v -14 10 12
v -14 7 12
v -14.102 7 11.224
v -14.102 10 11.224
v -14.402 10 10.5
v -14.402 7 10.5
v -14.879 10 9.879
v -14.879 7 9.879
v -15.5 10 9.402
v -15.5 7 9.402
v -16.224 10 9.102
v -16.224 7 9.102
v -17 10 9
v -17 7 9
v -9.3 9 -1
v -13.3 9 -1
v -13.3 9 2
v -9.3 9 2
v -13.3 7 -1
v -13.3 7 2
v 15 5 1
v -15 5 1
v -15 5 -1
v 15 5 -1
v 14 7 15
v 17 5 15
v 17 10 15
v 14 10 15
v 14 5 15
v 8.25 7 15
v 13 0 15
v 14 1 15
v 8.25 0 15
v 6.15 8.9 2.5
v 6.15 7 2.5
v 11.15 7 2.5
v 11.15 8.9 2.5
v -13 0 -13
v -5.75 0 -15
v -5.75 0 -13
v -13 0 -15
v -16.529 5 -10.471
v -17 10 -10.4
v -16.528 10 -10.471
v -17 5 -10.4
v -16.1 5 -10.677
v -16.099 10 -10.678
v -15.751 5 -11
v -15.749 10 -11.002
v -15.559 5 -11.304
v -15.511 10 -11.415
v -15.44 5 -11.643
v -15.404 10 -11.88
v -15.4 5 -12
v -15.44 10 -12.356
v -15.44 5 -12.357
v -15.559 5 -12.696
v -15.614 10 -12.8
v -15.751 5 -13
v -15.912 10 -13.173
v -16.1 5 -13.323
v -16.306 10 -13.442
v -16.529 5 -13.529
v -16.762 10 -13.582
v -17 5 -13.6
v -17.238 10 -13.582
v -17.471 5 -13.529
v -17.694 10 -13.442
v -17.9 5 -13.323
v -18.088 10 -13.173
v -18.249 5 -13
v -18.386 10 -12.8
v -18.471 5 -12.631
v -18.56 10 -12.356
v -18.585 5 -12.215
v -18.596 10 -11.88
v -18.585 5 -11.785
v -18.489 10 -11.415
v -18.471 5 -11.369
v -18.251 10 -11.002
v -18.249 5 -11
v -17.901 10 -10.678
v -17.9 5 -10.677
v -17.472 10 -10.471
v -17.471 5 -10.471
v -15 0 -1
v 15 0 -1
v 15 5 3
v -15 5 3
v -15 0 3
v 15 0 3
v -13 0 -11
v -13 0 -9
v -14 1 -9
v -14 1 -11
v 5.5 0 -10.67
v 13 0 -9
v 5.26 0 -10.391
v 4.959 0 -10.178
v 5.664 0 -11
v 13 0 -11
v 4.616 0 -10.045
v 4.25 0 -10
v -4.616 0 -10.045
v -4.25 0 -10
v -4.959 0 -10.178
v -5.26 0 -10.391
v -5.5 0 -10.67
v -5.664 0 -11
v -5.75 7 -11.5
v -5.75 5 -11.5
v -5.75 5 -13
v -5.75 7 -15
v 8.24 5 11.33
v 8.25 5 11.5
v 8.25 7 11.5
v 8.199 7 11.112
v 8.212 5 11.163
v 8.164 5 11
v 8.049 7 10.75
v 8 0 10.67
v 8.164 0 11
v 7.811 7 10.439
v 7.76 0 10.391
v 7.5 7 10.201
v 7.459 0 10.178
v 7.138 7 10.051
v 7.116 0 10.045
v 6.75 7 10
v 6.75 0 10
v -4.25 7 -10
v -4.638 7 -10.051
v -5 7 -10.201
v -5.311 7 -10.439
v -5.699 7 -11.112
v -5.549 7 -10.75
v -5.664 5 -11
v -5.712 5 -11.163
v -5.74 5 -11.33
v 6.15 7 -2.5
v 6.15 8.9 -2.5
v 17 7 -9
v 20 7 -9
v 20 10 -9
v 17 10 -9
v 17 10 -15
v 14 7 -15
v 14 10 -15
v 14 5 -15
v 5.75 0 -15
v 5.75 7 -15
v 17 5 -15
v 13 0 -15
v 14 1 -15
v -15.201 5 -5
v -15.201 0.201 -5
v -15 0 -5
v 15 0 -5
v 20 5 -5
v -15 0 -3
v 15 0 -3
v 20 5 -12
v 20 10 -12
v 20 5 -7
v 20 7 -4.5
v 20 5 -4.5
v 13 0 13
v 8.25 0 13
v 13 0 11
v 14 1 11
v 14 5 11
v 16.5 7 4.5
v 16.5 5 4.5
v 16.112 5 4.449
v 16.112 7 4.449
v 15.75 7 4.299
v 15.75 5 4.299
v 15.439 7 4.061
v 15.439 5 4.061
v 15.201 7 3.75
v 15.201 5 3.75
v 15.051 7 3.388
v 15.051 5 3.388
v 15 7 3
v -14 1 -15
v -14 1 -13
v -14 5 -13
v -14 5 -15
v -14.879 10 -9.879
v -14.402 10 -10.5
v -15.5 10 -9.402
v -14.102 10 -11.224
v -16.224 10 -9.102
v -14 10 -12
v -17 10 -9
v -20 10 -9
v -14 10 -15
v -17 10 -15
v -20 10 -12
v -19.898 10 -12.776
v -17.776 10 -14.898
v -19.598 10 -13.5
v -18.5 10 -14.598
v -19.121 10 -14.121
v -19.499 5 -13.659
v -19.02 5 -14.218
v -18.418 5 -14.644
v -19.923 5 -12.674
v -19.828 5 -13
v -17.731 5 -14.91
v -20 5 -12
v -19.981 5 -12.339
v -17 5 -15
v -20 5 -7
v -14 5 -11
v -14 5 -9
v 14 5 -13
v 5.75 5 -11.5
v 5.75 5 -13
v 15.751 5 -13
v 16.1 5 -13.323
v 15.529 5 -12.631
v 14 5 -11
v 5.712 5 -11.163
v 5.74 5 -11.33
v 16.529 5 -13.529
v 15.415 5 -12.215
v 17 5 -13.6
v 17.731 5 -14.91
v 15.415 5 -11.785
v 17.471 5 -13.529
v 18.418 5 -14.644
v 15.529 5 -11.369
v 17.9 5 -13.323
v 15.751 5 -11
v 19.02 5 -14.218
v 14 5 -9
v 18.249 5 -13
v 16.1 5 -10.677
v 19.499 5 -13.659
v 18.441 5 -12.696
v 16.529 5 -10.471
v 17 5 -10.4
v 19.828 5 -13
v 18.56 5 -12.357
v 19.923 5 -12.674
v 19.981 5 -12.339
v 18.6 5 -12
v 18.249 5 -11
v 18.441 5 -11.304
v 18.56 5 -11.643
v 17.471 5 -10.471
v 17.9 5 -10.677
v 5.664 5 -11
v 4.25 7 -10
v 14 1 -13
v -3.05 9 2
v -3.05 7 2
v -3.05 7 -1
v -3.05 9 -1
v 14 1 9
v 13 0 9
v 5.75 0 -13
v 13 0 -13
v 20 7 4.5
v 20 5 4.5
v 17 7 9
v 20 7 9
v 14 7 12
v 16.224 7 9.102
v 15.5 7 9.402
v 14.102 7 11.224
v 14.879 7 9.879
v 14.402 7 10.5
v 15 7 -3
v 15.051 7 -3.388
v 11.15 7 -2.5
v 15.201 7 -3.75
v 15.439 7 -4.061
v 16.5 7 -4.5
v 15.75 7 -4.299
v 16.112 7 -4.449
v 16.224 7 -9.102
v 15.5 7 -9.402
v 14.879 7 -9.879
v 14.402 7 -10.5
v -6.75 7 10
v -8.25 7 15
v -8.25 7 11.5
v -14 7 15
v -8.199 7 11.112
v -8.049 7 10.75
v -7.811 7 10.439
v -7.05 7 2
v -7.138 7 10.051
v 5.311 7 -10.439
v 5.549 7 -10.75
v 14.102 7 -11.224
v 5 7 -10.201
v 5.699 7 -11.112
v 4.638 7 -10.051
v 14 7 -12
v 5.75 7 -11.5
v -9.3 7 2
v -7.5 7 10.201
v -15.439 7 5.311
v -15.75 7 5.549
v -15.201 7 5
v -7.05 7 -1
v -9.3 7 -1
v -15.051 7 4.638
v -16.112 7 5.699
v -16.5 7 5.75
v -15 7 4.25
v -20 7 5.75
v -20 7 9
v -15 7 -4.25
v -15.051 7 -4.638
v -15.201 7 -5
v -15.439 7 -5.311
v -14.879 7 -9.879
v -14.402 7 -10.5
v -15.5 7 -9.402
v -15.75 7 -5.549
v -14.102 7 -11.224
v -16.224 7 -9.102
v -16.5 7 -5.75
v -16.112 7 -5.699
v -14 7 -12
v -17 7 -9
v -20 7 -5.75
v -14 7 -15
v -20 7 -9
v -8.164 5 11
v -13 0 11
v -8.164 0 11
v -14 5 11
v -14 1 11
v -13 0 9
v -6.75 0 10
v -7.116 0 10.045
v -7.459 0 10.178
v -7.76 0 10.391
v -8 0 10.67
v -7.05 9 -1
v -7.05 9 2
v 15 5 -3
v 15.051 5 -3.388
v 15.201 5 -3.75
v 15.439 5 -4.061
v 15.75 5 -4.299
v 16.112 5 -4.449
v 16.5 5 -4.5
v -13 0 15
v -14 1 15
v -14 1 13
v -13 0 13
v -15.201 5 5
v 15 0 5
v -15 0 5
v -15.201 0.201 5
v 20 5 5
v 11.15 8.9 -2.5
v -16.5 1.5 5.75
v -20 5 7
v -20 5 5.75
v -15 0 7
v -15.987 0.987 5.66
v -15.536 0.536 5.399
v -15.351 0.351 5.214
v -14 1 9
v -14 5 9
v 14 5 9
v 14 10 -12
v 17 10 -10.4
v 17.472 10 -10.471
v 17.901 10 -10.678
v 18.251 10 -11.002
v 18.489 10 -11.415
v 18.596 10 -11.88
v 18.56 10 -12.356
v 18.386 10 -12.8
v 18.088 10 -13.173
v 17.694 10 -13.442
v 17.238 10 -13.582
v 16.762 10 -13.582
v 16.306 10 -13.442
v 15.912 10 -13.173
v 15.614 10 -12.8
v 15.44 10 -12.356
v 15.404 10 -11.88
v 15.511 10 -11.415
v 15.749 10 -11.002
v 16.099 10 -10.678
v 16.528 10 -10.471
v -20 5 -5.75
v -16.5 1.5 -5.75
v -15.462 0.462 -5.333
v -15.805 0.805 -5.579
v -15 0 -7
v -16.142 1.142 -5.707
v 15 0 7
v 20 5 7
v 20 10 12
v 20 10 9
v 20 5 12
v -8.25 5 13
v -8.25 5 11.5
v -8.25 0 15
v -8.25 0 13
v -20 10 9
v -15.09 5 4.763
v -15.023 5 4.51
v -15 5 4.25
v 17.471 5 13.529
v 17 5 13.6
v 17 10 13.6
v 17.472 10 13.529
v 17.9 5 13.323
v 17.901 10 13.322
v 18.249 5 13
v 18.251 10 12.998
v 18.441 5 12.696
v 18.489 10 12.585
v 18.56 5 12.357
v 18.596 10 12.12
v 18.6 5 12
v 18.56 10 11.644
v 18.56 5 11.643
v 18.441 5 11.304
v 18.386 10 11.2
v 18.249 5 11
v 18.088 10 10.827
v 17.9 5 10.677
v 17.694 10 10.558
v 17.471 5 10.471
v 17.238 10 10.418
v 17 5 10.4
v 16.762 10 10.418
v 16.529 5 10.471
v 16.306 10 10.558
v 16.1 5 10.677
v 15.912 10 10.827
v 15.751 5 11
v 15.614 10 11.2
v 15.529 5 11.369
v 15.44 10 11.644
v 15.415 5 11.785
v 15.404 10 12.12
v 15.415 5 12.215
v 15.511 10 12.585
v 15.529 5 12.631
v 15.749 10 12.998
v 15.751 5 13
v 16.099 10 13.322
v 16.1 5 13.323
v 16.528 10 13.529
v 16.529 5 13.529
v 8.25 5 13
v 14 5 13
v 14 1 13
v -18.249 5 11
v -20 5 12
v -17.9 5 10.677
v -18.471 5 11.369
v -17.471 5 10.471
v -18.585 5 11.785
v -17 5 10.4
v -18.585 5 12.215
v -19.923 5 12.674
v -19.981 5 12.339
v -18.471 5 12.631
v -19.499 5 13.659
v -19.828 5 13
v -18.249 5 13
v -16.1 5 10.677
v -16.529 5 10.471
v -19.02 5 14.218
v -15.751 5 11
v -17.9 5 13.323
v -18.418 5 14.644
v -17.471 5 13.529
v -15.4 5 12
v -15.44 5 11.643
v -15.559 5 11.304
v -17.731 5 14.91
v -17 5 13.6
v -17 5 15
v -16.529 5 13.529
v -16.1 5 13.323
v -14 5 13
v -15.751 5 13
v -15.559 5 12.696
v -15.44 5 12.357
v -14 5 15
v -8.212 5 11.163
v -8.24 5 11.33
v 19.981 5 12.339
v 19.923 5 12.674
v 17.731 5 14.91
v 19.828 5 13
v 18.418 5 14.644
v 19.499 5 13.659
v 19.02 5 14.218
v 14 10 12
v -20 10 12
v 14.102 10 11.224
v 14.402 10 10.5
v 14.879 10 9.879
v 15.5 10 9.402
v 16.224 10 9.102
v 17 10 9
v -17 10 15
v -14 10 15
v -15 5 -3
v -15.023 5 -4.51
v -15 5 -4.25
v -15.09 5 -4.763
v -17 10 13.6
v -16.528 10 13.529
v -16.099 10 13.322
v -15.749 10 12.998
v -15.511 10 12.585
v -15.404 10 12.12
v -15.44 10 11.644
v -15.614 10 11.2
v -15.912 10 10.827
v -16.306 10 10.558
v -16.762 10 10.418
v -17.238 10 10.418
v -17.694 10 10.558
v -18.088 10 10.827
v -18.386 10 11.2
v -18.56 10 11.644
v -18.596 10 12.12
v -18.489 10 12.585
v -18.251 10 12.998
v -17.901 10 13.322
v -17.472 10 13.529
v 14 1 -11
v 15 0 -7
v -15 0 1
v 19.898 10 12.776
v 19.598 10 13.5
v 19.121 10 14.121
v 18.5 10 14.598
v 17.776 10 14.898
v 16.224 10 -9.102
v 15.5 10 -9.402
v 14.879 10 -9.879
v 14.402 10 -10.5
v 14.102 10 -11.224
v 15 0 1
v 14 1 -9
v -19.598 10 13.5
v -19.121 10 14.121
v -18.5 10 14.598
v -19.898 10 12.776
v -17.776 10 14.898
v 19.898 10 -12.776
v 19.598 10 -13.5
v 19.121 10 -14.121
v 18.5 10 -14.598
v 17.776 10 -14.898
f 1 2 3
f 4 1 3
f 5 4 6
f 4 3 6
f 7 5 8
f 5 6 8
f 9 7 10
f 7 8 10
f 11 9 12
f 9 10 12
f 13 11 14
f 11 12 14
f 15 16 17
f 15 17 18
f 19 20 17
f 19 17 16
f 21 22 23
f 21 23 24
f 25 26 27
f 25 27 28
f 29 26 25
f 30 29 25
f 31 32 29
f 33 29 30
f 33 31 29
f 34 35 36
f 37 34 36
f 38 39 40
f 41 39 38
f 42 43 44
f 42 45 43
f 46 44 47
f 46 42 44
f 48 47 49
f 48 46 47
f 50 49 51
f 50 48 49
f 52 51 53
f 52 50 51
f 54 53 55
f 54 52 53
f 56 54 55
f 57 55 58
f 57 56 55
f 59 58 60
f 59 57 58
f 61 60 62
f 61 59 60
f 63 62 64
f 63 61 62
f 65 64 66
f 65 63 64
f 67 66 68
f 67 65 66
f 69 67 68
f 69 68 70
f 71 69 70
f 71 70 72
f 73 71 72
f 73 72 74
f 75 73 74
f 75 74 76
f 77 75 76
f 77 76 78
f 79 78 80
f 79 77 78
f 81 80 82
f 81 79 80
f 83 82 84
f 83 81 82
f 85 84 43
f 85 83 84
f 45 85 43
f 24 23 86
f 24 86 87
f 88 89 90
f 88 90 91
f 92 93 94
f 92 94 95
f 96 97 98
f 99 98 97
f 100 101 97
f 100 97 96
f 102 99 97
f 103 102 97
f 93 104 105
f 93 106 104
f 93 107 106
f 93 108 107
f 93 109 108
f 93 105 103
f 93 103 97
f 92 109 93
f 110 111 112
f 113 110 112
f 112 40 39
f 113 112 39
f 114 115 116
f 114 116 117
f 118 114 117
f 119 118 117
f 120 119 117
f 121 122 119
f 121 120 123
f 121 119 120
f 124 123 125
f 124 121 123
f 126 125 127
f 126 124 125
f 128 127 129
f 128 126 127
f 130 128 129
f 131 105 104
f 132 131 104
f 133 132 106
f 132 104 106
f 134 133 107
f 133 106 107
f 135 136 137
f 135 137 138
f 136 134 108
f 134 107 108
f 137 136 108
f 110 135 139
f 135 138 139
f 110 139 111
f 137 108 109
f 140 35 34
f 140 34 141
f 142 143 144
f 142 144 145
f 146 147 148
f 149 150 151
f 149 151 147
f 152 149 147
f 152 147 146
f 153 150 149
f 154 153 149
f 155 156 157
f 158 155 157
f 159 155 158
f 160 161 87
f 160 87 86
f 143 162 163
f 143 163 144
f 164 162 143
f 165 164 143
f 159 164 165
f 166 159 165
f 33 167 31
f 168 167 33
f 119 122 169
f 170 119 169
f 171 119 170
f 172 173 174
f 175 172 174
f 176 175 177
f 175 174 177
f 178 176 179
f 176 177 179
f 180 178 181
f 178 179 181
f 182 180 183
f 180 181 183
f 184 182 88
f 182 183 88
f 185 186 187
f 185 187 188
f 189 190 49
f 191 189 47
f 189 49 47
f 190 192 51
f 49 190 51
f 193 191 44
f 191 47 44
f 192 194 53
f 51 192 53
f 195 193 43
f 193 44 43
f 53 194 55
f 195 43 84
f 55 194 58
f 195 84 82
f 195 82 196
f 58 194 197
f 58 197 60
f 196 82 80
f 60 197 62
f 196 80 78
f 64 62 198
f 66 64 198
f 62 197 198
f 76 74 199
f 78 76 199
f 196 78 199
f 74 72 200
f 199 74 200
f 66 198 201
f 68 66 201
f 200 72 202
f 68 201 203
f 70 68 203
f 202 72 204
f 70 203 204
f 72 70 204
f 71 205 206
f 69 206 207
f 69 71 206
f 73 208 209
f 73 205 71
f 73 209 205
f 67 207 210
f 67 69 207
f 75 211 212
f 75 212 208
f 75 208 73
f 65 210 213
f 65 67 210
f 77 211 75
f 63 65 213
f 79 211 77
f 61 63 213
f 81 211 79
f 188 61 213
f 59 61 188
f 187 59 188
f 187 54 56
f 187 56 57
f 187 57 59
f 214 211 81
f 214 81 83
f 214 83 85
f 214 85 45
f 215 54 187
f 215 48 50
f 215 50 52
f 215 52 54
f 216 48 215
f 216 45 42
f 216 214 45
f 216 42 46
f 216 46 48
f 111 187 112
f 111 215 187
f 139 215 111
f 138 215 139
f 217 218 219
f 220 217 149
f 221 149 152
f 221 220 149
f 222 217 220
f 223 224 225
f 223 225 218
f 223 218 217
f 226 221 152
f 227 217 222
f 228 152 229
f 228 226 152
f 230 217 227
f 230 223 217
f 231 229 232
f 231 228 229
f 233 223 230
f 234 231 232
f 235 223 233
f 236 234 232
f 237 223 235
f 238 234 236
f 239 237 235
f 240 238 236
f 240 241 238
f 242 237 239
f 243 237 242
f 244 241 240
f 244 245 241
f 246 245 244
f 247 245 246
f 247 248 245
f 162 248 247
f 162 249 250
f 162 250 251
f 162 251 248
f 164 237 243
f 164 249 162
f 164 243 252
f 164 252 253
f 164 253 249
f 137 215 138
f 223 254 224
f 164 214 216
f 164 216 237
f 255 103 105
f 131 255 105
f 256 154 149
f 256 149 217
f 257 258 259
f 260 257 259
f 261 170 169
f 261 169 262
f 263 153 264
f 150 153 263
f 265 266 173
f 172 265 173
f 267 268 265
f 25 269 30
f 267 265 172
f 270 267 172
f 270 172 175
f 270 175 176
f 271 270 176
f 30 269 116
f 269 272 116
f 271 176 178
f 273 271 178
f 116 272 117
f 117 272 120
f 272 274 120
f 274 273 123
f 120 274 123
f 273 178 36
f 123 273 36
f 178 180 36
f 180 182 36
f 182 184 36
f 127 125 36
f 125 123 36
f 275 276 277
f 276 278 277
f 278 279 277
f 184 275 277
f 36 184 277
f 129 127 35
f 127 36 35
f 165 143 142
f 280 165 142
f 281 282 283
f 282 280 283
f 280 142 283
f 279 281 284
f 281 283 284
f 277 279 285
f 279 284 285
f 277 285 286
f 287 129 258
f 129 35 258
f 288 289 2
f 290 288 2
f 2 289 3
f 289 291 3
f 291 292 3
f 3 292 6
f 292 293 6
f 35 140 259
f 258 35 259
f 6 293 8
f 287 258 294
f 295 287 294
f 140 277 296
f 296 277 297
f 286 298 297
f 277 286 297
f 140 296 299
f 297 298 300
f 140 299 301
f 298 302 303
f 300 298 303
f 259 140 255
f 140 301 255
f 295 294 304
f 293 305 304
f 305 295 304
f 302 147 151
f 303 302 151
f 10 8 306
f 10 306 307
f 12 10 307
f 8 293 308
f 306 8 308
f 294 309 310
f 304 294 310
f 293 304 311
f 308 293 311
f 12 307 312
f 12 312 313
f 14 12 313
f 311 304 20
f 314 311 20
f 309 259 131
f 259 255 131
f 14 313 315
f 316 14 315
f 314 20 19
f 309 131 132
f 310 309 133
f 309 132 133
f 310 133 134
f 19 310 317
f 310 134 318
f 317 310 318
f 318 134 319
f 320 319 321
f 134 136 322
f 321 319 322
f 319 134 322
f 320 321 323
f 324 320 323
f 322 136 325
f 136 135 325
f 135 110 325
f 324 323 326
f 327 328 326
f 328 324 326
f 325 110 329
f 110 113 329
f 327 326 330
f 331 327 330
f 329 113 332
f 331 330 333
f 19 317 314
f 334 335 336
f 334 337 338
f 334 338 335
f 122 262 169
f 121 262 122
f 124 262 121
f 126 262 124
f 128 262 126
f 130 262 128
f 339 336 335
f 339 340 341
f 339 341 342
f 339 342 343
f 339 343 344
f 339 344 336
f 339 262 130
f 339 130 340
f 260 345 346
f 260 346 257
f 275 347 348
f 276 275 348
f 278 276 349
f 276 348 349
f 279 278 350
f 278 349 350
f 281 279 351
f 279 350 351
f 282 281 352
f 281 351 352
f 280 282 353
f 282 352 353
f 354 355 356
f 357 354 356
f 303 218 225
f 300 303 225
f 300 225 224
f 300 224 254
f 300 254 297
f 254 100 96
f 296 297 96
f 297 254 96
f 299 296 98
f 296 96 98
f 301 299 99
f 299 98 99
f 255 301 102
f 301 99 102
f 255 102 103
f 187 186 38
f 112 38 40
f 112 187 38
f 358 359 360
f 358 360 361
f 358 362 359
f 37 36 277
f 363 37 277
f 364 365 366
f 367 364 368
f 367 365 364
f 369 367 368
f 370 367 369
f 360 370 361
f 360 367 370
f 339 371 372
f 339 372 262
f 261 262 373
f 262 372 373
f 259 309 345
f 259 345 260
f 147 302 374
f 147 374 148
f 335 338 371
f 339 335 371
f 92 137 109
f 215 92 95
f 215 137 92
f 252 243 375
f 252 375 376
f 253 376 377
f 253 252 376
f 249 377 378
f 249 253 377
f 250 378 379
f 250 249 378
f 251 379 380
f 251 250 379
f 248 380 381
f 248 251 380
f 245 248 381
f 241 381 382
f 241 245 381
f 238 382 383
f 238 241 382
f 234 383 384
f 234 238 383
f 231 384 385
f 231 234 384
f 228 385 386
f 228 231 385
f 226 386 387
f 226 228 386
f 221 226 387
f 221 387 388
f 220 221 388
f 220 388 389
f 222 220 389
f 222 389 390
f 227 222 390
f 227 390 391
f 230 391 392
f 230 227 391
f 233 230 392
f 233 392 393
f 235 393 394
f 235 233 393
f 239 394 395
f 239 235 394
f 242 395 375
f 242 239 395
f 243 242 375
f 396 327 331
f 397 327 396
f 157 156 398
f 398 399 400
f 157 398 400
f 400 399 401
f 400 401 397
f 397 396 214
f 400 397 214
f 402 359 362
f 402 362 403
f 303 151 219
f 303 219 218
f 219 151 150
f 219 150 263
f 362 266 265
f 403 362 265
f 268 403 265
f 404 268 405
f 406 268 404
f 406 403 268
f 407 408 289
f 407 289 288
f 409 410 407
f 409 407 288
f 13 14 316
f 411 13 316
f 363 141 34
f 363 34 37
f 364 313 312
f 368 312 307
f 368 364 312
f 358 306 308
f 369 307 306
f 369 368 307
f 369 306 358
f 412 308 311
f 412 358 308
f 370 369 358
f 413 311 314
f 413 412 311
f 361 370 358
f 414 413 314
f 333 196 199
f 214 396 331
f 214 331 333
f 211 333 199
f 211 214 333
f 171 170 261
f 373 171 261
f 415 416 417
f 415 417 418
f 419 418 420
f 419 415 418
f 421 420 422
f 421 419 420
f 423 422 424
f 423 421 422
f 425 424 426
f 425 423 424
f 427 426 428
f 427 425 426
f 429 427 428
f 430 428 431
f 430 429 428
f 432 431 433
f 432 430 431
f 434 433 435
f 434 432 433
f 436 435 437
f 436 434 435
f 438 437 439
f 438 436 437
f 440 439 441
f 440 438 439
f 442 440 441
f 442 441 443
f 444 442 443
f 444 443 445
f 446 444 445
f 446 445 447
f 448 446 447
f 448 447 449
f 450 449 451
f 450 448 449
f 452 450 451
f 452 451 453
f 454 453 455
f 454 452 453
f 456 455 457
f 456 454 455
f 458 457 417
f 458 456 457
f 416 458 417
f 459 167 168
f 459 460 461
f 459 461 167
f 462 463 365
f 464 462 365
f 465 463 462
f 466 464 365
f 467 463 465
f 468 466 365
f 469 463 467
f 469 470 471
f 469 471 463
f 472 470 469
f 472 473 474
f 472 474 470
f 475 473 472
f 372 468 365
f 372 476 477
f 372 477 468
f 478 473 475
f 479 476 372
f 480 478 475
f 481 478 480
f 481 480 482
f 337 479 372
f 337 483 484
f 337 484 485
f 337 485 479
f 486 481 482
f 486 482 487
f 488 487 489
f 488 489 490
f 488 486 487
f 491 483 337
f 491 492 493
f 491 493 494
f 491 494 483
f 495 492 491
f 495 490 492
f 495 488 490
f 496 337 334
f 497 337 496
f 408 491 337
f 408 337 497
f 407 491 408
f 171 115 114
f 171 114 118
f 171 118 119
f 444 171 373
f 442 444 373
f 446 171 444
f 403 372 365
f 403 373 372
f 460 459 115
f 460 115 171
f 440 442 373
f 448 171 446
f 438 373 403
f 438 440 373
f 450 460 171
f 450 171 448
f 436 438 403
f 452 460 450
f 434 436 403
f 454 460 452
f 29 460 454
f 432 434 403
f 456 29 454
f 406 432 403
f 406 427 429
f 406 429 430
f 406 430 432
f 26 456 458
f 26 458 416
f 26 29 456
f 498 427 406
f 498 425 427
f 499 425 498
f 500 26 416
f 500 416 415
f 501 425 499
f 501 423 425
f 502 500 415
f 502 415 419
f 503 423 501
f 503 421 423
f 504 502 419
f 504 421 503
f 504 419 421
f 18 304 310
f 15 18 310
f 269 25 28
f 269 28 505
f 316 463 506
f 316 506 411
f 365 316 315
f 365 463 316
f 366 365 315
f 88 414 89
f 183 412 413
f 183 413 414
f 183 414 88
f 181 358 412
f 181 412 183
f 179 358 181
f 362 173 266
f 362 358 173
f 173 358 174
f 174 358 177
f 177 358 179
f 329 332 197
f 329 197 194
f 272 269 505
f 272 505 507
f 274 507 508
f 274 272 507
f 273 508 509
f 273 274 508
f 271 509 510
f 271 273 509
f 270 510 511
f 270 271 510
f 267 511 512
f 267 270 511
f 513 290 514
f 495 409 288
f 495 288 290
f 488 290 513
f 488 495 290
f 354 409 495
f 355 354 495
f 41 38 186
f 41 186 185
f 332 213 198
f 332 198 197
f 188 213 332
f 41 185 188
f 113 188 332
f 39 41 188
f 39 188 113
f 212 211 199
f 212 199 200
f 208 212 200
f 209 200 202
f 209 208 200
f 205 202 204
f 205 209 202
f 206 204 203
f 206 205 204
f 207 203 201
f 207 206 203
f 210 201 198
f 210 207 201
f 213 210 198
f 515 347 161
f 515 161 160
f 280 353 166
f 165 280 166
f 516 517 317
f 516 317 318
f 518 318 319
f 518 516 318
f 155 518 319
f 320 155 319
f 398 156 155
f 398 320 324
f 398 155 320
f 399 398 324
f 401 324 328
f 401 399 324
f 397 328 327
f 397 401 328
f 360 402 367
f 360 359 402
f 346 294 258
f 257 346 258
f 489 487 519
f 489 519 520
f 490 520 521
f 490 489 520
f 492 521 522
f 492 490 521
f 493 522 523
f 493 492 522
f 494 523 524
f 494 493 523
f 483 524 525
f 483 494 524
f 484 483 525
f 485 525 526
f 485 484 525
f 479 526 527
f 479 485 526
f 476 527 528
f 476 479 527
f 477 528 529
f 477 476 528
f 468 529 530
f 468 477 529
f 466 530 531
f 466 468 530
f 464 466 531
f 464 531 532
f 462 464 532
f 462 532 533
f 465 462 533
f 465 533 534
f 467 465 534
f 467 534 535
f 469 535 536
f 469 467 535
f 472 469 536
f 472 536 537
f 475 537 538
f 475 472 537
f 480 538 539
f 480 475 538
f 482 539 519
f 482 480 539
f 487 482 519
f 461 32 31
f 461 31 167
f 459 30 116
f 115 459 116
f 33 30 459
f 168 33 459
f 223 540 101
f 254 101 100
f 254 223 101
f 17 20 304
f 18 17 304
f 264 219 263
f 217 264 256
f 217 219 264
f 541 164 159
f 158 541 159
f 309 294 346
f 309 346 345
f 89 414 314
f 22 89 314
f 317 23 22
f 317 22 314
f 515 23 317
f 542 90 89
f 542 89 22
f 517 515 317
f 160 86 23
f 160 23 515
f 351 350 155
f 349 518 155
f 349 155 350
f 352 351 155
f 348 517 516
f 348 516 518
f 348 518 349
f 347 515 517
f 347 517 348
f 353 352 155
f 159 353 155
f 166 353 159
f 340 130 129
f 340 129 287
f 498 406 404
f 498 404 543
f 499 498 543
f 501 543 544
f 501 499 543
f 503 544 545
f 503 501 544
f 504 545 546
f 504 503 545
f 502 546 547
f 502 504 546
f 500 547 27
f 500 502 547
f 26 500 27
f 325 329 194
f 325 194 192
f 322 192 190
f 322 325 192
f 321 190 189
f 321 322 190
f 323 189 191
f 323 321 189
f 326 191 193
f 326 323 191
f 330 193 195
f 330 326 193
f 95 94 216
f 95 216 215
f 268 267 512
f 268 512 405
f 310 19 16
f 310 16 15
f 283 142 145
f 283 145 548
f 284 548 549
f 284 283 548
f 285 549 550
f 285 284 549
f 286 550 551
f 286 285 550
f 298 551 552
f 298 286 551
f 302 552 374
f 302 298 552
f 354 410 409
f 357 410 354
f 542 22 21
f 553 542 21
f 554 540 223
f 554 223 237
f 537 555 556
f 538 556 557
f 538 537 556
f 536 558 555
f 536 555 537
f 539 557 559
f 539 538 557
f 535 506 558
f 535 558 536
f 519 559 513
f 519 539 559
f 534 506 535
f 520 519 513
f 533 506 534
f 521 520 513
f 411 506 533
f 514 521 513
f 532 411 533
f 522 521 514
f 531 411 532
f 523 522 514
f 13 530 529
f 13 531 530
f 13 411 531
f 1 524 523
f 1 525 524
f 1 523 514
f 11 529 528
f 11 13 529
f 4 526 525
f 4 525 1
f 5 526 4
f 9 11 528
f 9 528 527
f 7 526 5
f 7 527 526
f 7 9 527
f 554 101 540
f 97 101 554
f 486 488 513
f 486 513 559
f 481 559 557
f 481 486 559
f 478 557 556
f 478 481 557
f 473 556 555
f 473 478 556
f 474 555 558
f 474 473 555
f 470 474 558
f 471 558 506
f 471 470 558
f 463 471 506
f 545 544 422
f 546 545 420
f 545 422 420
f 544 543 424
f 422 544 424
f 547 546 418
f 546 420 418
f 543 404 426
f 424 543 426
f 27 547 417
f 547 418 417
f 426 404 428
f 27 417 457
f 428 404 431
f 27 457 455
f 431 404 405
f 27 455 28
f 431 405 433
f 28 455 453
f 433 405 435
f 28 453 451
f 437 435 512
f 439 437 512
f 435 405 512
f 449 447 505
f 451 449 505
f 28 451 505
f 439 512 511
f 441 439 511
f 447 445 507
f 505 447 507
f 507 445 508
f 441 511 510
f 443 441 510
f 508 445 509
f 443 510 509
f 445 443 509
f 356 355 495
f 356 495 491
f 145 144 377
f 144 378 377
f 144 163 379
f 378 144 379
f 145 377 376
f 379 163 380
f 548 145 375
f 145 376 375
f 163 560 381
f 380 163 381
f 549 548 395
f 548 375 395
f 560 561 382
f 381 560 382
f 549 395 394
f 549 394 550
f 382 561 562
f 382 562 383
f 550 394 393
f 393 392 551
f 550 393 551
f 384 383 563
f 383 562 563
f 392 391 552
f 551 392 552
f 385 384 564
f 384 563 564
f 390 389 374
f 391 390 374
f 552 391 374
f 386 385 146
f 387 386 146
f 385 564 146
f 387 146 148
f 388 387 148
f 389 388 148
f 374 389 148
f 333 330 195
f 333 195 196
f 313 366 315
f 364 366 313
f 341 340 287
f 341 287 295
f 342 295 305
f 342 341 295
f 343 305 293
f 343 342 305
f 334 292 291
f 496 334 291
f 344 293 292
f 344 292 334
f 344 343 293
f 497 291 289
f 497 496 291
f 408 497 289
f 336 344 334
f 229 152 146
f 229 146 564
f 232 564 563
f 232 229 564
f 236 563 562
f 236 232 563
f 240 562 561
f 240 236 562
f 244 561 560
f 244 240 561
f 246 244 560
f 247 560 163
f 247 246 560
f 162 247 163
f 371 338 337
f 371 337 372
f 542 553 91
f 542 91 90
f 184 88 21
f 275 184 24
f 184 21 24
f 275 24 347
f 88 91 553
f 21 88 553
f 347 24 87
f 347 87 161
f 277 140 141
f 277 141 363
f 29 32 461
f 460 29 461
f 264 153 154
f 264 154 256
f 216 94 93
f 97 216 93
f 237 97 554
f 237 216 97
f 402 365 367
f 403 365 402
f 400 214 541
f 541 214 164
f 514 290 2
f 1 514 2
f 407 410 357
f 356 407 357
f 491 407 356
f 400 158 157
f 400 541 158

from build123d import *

# Parameters (mm, degrees)
SKETCH_1_R          = 1.6
EXTRUDE_1_DEPTH     = 7
SKETCH_2_R          = 1.6
SKETCH_2_W          = 5
SKETCH_2_H          = 5
SKETCH_2_W_2        = 4
SKETCH_2_H_2        = 3
EXTRUDE_2_DEPTH     = 3
CUT_EXTRUDE_1_DEPTH = 31
CUT_EXTRUDE_START   = -5
SKETCH_5_W          = 40
SKETCH_5_H          = 2
SKETCH_5_W_2        = 30
CUT_EXTRUDE_2_DEPTH = 5
CUT_EXTRUDE_START_2 = -31
SKETCH_6_R          = 1.6
CUT_EXTRUDE_3_DEPTH = 31
CHAMFER_1_SIZE      = 5
CHAMFER_2_SIZE      = 5
CHAMFER_3_SIZE      = 1
SKETCH_7_W          = 9.893762321
SKETCH_7_H          = 9.992699944
CUT_EXTRUDE_4_DEPTH = 1.1
SKETCH_8_W          = 19.688587018
SKETCH_8_H          = 7.420321741
CUT_EXTRUDE_5_DEPTH = 1


with BuildPart() as part:
    # Эскиз1 → Бобышка-Вытянуть1 (new body)
    with BuildSketch(Plane(origin=(0, 0, 0), x_dir=(1, 0, 0), z_dir=(0, 1, 0))):
        with BuildLine():
            Line((-17, 15), (17, 15))
            ThreePointArc((17, 15), (19.121320344, 14.121320344), (20, 12))
            Line((20, 12), (20, -12))
            ThreePointArc((20, -12), (19.121320344, -14.121320344), (17, -15))
            Line((17, -15), (-17, -15))
            ThreePointArc((-17, -15), (-19.121320344, -14.121320344), (-20, -12))
            Line((-20, -12), (-20, 12))
            ThreePointArc((-20, 12), (-19.121320344, 14.121320344), (-17, 15))
        make_face()
        with Locations(Location((-17, 12, 0), (0, 0, 270))):
            Circle(SKETCH_1_R, mode=Mode.SUBTRACT)
        with Locations(Location((17, 12, 0), (0, 0, 270))):
            Circle(SKETCH_1_R, mode=Mode.SUBTRACT)
        with Locations(Location((17, -12, 0), (0, 0, 270))):
            Circle(SKETCH_1_R, mode=Mode.SUBTRACT)
        with Locations(Location((-17, -12, 0), (0, 0, 270))):
            Circle(SKETCH_1_R, mode=Mode.SUBTRACT)
    extrude(amount=EXTRUDE_1_DEPTH)

    # Эскиз2 → Бобышка-Вытянуть2 (add)
    # profile 1 of 7: a face of its own
    with BuildSketch(Plane(origin=(0, 7, 0), x_dir=(1, 0, 0), z_dir=(0, 1, 0))):
        with BuildLine():
            Line((-17, 9), (-20, 9))
            Line((-20, 9), (-20, 12))
            ThreePointArc((-20, 12), (-19.121320344, 14.121320344), (-17, 15))
            Line((-17, 15), (-14, 15))
            Line((-14, 15), (-14, 12))
            ThreePointArc((-14, 12), (-14.878679656, 9.878679656), (-17, 9))
        make_face()
        with Locations(Location((-17, 12, 0), (0, 0, 270))):
            Circle(SKETCH_2_R, mode=Mode.SUBTRACT)
    # profile 2 of 7: a face of its own
    with BuildSketch(Plane(origin=(0, 7, 0), x_dir=(1, 0, 0), z_dir=(0, 1, 0))):
        with BuildLine():
            Line((14, 12), (14, 15))
            Line((14, 15), (17, 15))
            ThreePointArc((17, 15), (19.121320344, 14.121320344), (20, 12))
            Line((20, 12), (20, 9))
            Line((20, 9), (17, 9))
            ThreePointArc((17, 9), (14.878679656, 9.878679656), (14, 12))
        make_face()
        with Locations(Location((17, 12, 0), (0, 0, 270))):
            Circle(SKETCH_2_R, mode=Mode.SUBTRACT)
    # profile 3 of 7: a face of its own
    with BuildSketch(Plane(origin=(0, 7, 0), x_dir=(1, 0, 0), z_dir=(0, 1, 0))):
        with BuildLine():
            Line((17, -9), (20, -9))
            Line((20, -9), (20, -12))
            ThreePointArc((20, -12), (19.121320344, -14.121320344), (17, -15))
            Line((17, -15), (14, -15))
            Line((14, -15), (14, -12))
            ThreePointArc((14, -12), (14.878679656, -9.878679656), (17, -9))
        make_face()
        with Locations(Location((17, -12, 0), (0, 0, 270))):
            Circle(SKETCH_2_R, mode=Mode.SUBTRACT)
    # profile 4 of 7: a face of its own
    with BuildSketch(Plane(origin=(0, 7, 0), x_dir=(1, 0, 0), z_dir=(0, 1, 0))):
        with BuildLine():
            Line((-17, -9), (-20, -9))
            Line((-20, -9), (-20, -12))
            ThreePointArc((-20, -12), (-19.121320344, -14.121320344), (-17, -15))
            Line((-17, -15), (-14, -15))
            Line((-14, -15), (-14, -12))
            ThreePointArc((-14, -12), (-14.878679656, -9.878679656), (-17, -9))
        make_face()
        with Locations(Location((-17, -12, 0), (0, 0, 270))):
            Circle(SKETCH_2_R, mode=Mode.SUBTRACT)
    # profile 5 of 7: a face of its own
    with BuildSketch(Plane(origin=(0, 7, 0), x_dir=(1, 0, 0), z_dir=(0, 1, 0))):
        with Locations((8.65, 0)):
            Rectangle(SKETCH_2_W, SKETCH_2_H)
    # profile 6 of 7: a face of its own
    with BuildSketch(Plane(origin=(0, 7, 0), x_dir=(1, 0, 0), z_dir=(0, 1, 0))):
        with Locations((-5.05, -0.5)):
            Rectangle(SKETCH_2_W_2, SKETCH_2_H_2)
    # profile 7 of 7: a face of its own
    with BuildSketch(Plane(origin=(0, 7, 0), x_dir=(1, 0, 0), z_dir=(0, 1, 0))):
        with Locations((-11.3, -0.5)):
            Rectangle(SKETCH_2_W_2, SKETCH_2_H_2)
    extrude(amount=EXTRUDE_2_DEPTH)

    # Эскиз4 → Вырез-Вытянуть1 (cut)
    with BuildSketch(Plane.XZ):
        with BuildLine():
            Line((-5.75, -20), (5.75, -20))
            Line((5.75, -20), (5.75, -11.5))
            ThreePointArc((5.75, -11.5), (5.310660172, -10.439339828), (4.25, -10))
            Line((4.25, -10), (-4.25, -10))
            ThreePointArc((-4.25, -10), (-5.310660172, -10.439339828), (-5.75, -11.5))
            Line((-5.75, -11.5), (-5.75, -20))
        make_face()
        with BuildLine():
            Line((-25, 5.75), (-16.5, 5.75))
            ThreePointArc((-16.5, 5.75), (-15.439339828, 5.310660172), (-15, 4.25))
            Line((-15, 4.25), (-15, -4.25))
            ThreePointArc((-15, -4.25), (-15.439339828, -5.310660172), (-16.5, -5.75))
            Line((-16.5, -5.75), (-25, -5.75))
            Line((-25, -5.75), (-25, 5.75))
        make_face()
        with BuildLine():
            Line((-8.25, 20), (8.25, 20))
            Line((8.25, 20), (8.25, 11.5))
            ThreePointArc((8.25, 11.5), (7.810660172, 10.439339828), (6.75, 10))
            Line((6.75, 10), (-6.75, 10))
            ThreePointArc((-6.75, 10), (-7.810660172, 10.439339828), (-8.25, 11.5))
            Line((-8.25, 11.5), (-8.25, 20))
        make_face()
        with BuildLine():
            Line((25, 4.5), (16.5, 4.5))
            ThreePointArc((16.5, 4.5), (15.439339828, 4.060660172), (15, 3))
            Line((15, 3), (15, -3))
            ThreePointArc((15, -3), (15.439339828, -4.060660172), (16.5, -4.5))
            Line((16.5, -4.5), (25, -4.5))
            Line((25, -4.5), (25, 4.5))
        make_face()
    extrude(amount=-CUT_EXTRUDE_1_DEPTH, mode=Mode.SUBTRACT)

    # Эскиз5 → Вырез-Вытянуть2 (cut)
    with BuildSketch(Plane.XZ.offset(CUT_EXTRUDE_START)):
        with BuildLine():
            Line((-5.664213562, -11), (-15.7510004, -11))
            ThreePointArc((-15.7510004, -11), (-15.490298149, -11.470094046), (-15.4, -12))
            ThreePointArc((-15.4, -12), (-15.490298149, -12.529905954), (-15.7510004, -13))
            Line((-15.7510004, -13), (-5.75, -13))
            Line((-5.75, -13), (-5.75, -11.5))
            ThreePointArc((-5.75, -11.5), (-5.728397839, -11.246347032), (-5.664213562, -11))
        make_face()
        with BuildLine():
            ThreePointArc((15.7510004, -13), (15.4, -12), (15.7510004, -11))
            Line((15.7510004, -11), (5.664213562, -11))
            ThreePointArc((5.664213562, -11), (5.728397839, -11.246347032), (5.75, -11.5))
            Line((5.75, -11.5), (5.75, -13))
            Line((5.75, -13), (15.7510004, -13))
        make_face()
        with BuildLine():
            Line((20, -12), (20, -11))
            Line((20, -11), (18.2489996, -11))
            ThreePointArc((18.2489996, -11), (18.509701851, -11.470094046), (18.6, -12))
            ThreePointArc((18.6, -12), (18.509701851, -12.529905954), (18.2489996, -13))
            Line((18.2489996, -13), (19.828427125, -13))
            ThreePointArc((19.828427125, -13), (19.956795679, -12.507305936), (20, -12))
        make_face()
        with BuildLine():
            Line((-18.2489996, -11), (-20, -11))
            Line((-20, -11), (-20, -12))
            ThreePointArc((-20, -12), (-19.956795679, -12.507305936), (-19.828427125, -13))
            Line((-19.828427125, -13), (-18.2489996, -13))
            ThreePointArc((-18.2489996, -13), (-18.6, -12), (-18.2489996, -11))
        make_face()
        with Locations((0, -8)):
            Rectangle(SKETCH_5_W, SKETCH_5_H)
        with BuildLine():
            Line((15, -3), (-15, -3))
            Line((-15, -3), (-15, -4.25))
            ThreePointArc((-15, -4.25), (-15.051111261, -4.638228568), (-15.200961894, -5))
            Line((-15.200961894, -5), (20, -5))
            Line((20, -5), (20, -4.5))
            Line((20, -4.5), (16.5, -4.5))
            ThreePointArc((16.5, -4.5), (15.439339828, -4.060660172), (15, -3))
        make_face()
        Rectangle(SKETCH_5_W_2, SKETCH_5_H)
        with BuildLine():
            Line((20, 5), (-15.200961894, 5))
            ThreePointArc((-15.200961894, 5), (-15.051111261, 4.638228568), (-15, 4.25))
            Line((-15, 4.25), (-15, 3))
            Line((-15, 3), (15, 3))
            ThreePointArc((15, 3), (15.439339828, 4.060660172), (16.5, 4.5))
            Line((16.5, 4.5), (20, 4.5))
            Line((20, 4.5), (20, 5))
        make_face()
        with Locations((0, 8)):
            Rectangle(SKETCH_5_W, SKETCH_5_H)
        with BuildLine():
            ThreePointArc((-15.4, 12), (-15.490298149, 11.470094046), (-15.7510004, 11))
            Line((-15.7510004, 11), (-8.164213562, 11))
            ThreePointArc((-8.164213562, 11), (-8.228397839, 11.246347032), (-8.25, 11.5))
            Line((-8.25, 11.5), (-8.25, 13))
            Line((-8.25, 13), (-15.7510004, 13))
            ThreePointArc((-15.7510004, 13), (-15.490298149, 12.529905954), (-15.4, 12))
        make_face()
        with BuildLine():
            Line((-20, 12), (-20, 11))
            Line((-20, 11), (-18.2489996, 11))
            ThreePointArc((-18.2489996, 11), (-18.6, 12), (-18.2489996, 13))
            Line((-18.2489996, 13), (-19.828427125, 13))
            ThreePointArc((-19.828427125, 13), (-19.956795679, 12.507305936), (-20, 12))
        make_face()
        with BuildLine():
            Line((8.164213562, 11), (15.7510004, 11))
            ThreePointArc((15.7510004, 11), (15.4, 12), (15.7510004, 13))
            Line((15.7510004, 13), (8.25, 13))
            Line((8.25, 13), (8.25, 11.5))
            ThreePointArc((8.25, 11.5), (8.228397839, 11.246347032), (8.164213562, 11))
        make_face()
        with BuildLine():
            Line((18.2489996, 11), (20, 11))
            Line((20, 11), (20, 12))
            ThreePointArc((20, 12), (19.956795679, 12.507305936), (19.828427125, 13))
            Line((19.828427125, 13), (18.2489996, 13))
            ThreePointArc((18.2489996, 13), (18.509701851, 12.529905954), (18.6, 12))
            ThreePointArc((18.6, 12), (18.509701851, 11.470094046), (18.2489996, 11))
        make_face()
    extrude(amount=CUT_EXTRUDE_2_DEPTH, mode=Mode.SUBTRACT)

    # Эскиз6 → Вырез-Вытянуть3 (cut)
    # profile 1 of 4: a face of its own
    with BuildSketch(Plane(origin=(0, 5, 0), x_dir=(1, 0, 0), z_dir=(0, 1, 0)).offset(CUT_EXTRUDE_START_2)):
        with BuildLine():
            Line((14, 12), (14, 9))
            Line((14, 9), (17, 9))
            Line((17, 9), (20, 9))
            Line((20, 9), (20, 12))
            ThreePointArc((20, 12), (19.121320344, 14.121320344), (17, 15))
            Line((17, 15), (14, 15))
            Line((14, 15), (14, 12))
        make_face()
        with Locations(Location((17, 12, 0), (0, 0, 270))):
            Circle(SKETCH_6_R, mode=Mode.SUBTRACT)
    # profile 2 of 4: a face of its own
    with BuildSketch(Plane(origin=(0, 5, 0), x_dir=(1, 0, 0), z_dir=(0, 1, 0)).offset(CUT_EXTRUDE_START_2)):
        with BuildLine():
            Line((14, -12), (14, -9))
            Line((14, -9), (17, -9))
            Line((17, -9), (20, -9))
            Line((20, -9), (20, -12))
            ThreePointArc((20, -12), (19.121320344, -14.121320344), (17, -15))
            Line((17, -15), (14, -15))
            Line((14, -15), (14, -12))
        make_face()
        with Locations(Location((17, -12, 0), (0, 0, 270))):
            Circle(SKETCH_6_R, mode=Mode.SUBTRACT)
    # profile 3 of 4: a face of its own
    with BuildSketch(Plane(origin=(0, 5, 0), x_dir=(1, 0, 0), z_dir=(0, 1, 0)).offset(CUT_EXTRUDE_START_2)):
        with BuildLine():
            Line((-20, 9), (-17, 9))
            Line((-17, 9), (-14, 9))
            Line((-14, 9), (-14, 12))
            Line((-14, 12), (-14, 15))
            Line((-14, 15), (-17, 15))
            ThreePointArc((-17, 15), (-19.121320344, 14.121320344), (-20, 12))
            Line((-20, 12), (-20, 9))
        make_face()
        with Locations(Location((-17, 12, 0), (0, 0, 270))):
            Circle(SKETCH_6_R, mode=Mode.SUBTRACT)
    # profile 4 of 4: a face of its own
    with BuildSketch(Plane(origin=(0, 5, 0), x_dir=(1, 0, 0), z_dir=(0, 1, 0)).offset(CUT_EXTRUDE_START_2)):
        with BuildLine():
            Line((-14, -15), (-14, -12))
            Line((-14, -12), (-14, -9))
            Line((-14, -9), (-17, -9))
            Line((-17, -9), (-20, -9))
            Line((-20, -9), (-20, -12))
            ThreePointArc((-20, -12), (-19.121320344, -14.121320344), (-17, -15))
            Line((-17, -15), (-14, -15))
        make_face()
        with Locations(Location((-17, -12, 0), (0, 0, 270))):
            Circle(SKETCH_6_R, mode=Mode.SUBTRACT)
    extrude(amount=CUT_EXTRUDE_3_DEPTH, mode=Mode.SUBTRACT)

    # Фаска1
    chamfer_1_edges = [part.edges().sort_by_distance(p)[0] for p in [
        (20, 0, 6),
        (20, 0, -6),
    ]]
    chamfer(chamfer_1_edges, length=CHAMFER_1_SIZE)

    # Фаска2
    chamfer_2_edges = [part.edges().sort_by_distance(p)[0] for p in [
        (-20, 0, 6.375),
        (-20, 0, -6.375),
    ]]
    chamfer(chamfer_2_edges, length=CHAMFER_2_SIZE)

    # Фаска3
    chamfer_3_edges = [part.edges().sort_by_distance(p)[0] for p in [
        (-14, 0, 10),
        (-14, 0, 14),
        (14, 0, -14),
        (14, 0, -10),
        (14, 0, 10),
        (14, 0, 14),
        (-14, 0, -14),
        (-14, 0, -10),
    ]]
    chamfer(chamfer_3_edges, length=CHAMFER_3_SIZE)

    # Эскиз7 → Вырез-Вытянуть4 (cut)
    with BuildSketch(Plane(origin=(0, 10, 0), x_dir=(1, 0, 0), z_dir=(0, 1, 0))):
        with Locations((8.731245249, 0)):
            Rectangle(SKETCH_7_W, SKETCH_7_H)
    extrude(amount=-CUT_EXTRUDE_4_DEPTH, mode=Mode.SUBTRACT)

    # Эскиз8 → Вырез-Вытянуть5 (cut)
    with BuildSketch(Plane(origin=(0, 10, 0), x_dir=(1, 0, 0), z_dir=(0, 1, 0))):
        with Locations((-7.741869016, -0.59362574)):
            Rectangle(SKETCH_8_W, SKETCH_8_H)
    extrude(amount=-CUT_EXTRUDE_5_DEPTH, mode=Mode.SUBTRACT)


solid = part.part
